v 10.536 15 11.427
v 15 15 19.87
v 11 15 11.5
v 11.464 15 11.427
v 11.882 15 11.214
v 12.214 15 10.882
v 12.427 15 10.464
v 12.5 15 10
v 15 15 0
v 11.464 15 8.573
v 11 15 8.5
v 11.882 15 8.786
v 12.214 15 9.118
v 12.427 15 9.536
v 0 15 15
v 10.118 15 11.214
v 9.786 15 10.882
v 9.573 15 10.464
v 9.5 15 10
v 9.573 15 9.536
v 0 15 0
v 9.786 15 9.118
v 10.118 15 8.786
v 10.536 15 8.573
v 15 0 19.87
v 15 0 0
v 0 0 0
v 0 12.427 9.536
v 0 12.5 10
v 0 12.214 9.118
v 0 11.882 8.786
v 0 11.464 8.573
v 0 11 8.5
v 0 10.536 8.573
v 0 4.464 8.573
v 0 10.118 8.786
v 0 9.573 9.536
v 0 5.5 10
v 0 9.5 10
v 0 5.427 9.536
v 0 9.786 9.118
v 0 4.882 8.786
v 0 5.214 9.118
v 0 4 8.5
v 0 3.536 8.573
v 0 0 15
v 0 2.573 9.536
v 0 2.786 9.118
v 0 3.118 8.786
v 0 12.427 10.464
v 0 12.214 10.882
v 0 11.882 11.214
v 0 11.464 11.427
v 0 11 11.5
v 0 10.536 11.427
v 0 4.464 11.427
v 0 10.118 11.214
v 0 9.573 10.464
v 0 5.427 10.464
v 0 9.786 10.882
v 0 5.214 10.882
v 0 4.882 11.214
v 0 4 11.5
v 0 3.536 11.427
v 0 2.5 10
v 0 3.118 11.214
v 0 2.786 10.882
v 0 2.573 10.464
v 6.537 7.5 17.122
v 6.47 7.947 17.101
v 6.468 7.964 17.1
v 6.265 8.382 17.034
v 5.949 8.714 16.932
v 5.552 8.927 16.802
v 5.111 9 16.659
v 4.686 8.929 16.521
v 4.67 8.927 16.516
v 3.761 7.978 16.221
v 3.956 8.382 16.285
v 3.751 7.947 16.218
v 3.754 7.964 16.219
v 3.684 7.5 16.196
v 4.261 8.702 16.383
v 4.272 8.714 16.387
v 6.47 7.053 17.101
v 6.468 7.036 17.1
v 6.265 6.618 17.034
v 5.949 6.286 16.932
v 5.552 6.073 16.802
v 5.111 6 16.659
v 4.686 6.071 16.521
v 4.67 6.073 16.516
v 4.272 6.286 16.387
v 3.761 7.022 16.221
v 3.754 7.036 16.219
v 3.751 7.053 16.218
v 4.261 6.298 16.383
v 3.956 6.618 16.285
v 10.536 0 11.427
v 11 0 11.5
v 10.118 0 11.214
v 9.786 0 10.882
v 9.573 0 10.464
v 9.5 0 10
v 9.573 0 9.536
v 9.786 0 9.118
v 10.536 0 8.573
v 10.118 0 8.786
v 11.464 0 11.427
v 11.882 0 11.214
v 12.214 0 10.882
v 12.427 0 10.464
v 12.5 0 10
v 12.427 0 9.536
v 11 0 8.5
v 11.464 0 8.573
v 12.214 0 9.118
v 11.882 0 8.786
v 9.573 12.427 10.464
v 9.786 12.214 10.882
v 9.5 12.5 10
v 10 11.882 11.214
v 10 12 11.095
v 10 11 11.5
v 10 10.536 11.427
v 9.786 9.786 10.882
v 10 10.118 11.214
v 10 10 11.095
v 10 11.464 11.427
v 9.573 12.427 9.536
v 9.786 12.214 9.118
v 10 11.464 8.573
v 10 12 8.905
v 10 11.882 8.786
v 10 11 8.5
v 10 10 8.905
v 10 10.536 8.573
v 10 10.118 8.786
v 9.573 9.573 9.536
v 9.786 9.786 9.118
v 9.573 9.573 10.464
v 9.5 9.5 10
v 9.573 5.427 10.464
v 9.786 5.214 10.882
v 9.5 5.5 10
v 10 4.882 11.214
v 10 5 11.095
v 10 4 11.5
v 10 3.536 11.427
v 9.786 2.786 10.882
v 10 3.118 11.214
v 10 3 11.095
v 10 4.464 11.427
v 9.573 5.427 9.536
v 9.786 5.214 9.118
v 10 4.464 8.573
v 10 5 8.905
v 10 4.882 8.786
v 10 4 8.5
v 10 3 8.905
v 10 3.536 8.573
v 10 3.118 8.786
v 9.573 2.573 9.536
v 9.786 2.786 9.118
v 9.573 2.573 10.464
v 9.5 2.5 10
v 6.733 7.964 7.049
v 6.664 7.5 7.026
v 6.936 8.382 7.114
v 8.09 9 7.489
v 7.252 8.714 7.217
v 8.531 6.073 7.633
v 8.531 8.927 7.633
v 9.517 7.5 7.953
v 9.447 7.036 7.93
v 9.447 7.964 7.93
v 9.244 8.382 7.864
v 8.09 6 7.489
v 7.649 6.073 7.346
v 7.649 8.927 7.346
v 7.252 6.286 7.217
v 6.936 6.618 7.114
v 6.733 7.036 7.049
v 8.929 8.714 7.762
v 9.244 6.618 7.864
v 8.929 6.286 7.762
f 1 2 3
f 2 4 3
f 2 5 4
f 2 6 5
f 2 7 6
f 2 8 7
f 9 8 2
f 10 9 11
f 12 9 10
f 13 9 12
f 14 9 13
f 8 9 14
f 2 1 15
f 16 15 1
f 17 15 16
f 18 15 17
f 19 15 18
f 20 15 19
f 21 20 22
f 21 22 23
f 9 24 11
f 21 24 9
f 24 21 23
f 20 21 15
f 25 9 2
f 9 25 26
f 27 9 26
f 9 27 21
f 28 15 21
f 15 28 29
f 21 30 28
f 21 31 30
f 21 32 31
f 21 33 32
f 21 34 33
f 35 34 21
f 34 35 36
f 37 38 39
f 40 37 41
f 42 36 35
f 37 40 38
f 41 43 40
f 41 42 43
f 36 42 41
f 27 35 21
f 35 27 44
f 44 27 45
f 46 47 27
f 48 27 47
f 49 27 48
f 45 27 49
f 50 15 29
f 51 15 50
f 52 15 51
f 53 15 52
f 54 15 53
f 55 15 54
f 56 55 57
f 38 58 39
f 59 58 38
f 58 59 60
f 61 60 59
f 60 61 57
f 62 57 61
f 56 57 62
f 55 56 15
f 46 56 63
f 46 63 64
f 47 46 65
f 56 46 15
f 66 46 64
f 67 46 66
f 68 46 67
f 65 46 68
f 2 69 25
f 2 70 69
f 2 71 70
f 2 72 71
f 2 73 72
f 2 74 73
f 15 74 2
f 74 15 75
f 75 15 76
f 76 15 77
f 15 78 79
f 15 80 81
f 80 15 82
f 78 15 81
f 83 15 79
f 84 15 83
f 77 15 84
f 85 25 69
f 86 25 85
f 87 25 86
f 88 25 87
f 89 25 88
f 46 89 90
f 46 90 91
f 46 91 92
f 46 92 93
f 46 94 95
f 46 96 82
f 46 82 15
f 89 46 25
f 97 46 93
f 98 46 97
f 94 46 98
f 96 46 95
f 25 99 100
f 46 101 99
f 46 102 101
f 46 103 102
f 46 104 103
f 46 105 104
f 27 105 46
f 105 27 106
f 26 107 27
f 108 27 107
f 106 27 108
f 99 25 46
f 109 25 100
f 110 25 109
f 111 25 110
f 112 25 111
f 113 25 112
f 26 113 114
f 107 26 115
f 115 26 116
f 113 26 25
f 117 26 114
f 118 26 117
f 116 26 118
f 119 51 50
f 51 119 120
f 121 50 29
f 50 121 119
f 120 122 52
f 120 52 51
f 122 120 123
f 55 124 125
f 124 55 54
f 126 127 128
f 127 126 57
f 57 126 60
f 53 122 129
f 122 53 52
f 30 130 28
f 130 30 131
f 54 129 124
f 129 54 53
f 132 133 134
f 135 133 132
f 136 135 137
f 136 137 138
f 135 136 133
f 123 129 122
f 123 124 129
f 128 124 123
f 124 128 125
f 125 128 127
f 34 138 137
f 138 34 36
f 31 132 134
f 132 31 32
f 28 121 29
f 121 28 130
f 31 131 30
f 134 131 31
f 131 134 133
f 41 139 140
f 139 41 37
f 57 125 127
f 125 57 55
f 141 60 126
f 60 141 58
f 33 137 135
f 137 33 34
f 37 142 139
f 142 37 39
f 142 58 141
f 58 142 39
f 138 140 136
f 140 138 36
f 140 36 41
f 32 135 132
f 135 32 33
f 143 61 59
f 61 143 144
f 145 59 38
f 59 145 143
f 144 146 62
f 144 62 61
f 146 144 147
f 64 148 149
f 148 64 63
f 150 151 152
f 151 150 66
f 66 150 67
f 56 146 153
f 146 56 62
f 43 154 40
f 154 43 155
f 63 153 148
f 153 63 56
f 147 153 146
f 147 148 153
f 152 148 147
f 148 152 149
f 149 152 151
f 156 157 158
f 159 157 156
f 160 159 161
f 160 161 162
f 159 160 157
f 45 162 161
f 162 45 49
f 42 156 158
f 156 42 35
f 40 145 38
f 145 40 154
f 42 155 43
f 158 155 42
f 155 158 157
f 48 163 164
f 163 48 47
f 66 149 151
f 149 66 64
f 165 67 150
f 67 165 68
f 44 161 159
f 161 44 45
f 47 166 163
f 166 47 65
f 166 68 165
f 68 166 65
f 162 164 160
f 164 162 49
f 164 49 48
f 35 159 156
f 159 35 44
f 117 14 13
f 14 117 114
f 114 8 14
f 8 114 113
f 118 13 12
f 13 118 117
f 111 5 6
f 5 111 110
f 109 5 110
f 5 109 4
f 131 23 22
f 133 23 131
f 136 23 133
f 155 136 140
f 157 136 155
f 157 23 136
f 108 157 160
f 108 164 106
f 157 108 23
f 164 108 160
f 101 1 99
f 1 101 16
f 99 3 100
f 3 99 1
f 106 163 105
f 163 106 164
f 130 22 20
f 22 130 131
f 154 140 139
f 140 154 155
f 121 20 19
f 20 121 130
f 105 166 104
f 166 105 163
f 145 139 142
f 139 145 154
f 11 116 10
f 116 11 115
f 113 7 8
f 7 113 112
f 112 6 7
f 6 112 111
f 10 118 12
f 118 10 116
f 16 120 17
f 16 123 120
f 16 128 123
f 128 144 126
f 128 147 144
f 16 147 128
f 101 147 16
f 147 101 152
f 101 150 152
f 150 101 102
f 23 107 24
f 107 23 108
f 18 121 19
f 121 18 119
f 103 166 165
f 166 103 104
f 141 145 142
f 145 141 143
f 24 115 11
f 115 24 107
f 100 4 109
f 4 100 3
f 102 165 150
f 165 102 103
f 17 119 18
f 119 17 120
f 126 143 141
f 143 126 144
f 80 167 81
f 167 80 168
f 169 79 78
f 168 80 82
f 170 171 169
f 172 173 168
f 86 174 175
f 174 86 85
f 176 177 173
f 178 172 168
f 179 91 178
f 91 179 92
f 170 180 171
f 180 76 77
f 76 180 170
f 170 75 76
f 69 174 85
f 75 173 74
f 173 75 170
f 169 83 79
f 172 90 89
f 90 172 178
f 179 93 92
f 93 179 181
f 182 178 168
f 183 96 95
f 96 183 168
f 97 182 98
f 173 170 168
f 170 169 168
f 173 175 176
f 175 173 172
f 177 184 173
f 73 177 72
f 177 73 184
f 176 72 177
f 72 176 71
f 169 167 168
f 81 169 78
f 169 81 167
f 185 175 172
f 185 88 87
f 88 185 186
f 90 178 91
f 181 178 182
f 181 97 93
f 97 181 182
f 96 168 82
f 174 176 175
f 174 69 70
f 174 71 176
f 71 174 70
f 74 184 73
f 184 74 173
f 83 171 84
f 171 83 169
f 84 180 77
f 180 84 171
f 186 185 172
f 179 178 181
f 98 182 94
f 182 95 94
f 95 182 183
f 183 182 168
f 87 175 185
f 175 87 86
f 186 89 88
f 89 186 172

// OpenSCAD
//connecting block for rear top of case
//angle is at 72 degrees

$fn = 20;

module block(){
    polygon([    [0,0],
                [0,15],
                [15,19.87],
                [15,0]
            ]);
}

difference(){
    
    translate([0,15,0]) rotate([90,0,0]) linear_extrude(15) block();
    
    translate([0,11,10]) rotate([90,0,90]) cylinder(10,1.5,1.5);
    translate([0,4,10]) rotate([90,0,90]) cylinder(10,1.5,1.5);
    translate([11,0,10]) rotate([270,0,0]) cylinder(15,1.5,1.5);
    translate([5,7.5,17]) rotate([0,162,0]) cylinder(10,1.5,1.5);
}
